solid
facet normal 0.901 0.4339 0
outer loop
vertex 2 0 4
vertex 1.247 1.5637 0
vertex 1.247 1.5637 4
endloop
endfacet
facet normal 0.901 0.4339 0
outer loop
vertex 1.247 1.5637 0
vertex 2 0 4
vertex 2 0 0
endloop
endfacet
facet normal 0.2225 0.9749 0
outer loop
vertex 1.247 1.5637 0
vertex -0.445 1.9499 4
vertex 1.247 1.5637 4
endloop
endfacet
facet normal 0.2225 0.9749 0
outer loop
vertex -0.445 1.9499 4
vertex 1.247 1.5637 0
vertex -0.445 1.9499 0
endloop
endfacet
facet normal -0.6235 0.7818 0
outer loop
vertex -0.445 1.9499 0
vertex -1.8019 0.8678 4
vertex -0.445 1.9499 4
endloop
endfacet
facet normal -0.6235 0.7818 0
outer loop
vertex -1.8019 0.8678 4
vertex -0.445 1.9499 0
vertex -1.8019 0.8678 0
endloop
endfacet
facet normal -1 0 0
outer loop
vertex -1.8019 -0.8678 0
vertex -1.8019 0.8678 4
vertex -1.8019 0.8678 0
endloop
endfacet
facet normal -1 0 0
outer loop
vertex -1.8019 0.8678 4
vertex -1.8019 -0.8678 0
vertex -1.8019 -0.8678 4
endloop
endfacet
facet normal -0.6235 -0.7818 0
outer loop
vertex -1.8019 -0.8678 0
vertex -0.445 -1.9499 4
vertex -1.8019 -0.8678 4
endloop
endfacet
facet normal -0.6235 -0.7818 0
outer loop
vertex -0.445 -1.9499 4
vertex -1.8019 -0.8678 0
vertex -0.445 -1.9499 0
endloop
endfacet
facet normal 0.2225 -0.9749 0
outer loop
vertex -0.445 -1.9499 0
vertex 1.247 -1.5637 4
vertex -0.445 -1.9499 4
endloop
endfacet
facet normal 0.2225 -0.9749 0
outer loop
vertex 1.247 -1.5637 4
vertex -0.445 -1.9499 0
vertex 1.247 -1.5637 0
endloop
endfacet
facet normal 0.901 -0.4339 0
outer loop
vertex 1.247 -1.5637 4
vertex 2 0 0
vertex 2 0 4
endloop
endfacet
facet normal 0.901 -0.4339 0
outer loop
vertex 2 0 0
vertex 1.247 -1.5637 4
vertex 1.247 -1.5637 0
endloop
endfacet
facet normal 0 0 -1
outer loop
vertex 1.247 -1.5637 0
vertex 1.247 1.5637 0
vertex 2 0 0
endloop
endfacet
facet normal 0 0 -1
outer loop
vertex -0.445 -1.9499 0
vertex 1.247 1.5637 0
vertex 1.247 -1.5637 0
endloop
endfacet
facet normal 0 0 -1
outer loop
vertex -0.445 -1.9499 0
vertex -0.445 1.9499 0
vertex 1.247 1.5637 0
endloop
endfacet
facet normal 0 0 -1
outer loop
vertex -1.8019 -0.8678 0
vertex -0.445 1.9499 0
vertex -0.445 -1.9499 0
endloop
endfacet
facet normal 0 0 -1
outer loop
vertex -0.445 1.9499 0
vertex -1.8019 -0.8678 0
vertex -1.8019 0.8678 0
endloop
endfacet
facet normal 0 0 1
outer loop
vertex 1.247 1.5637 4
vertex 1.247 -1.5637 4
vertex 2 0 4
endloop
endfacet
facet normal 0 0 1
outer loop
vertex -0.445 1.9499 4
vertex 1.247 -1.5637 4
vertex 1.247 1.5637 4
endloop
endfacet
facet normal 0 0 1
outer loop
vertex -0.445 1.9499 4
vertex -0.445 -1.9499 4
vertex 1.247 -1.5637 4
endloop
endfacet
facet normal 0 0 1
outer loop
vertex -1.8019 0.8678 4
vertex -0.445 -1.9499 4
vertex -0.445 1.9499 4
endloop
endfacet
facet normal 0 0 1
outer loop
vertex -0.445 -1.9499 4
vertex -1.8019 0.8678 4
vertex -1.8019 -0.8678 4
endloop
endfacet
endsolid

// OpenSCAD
union() {
  translate([0, 0, 0]) cylinder(h=4, r=2, center=false);
}
